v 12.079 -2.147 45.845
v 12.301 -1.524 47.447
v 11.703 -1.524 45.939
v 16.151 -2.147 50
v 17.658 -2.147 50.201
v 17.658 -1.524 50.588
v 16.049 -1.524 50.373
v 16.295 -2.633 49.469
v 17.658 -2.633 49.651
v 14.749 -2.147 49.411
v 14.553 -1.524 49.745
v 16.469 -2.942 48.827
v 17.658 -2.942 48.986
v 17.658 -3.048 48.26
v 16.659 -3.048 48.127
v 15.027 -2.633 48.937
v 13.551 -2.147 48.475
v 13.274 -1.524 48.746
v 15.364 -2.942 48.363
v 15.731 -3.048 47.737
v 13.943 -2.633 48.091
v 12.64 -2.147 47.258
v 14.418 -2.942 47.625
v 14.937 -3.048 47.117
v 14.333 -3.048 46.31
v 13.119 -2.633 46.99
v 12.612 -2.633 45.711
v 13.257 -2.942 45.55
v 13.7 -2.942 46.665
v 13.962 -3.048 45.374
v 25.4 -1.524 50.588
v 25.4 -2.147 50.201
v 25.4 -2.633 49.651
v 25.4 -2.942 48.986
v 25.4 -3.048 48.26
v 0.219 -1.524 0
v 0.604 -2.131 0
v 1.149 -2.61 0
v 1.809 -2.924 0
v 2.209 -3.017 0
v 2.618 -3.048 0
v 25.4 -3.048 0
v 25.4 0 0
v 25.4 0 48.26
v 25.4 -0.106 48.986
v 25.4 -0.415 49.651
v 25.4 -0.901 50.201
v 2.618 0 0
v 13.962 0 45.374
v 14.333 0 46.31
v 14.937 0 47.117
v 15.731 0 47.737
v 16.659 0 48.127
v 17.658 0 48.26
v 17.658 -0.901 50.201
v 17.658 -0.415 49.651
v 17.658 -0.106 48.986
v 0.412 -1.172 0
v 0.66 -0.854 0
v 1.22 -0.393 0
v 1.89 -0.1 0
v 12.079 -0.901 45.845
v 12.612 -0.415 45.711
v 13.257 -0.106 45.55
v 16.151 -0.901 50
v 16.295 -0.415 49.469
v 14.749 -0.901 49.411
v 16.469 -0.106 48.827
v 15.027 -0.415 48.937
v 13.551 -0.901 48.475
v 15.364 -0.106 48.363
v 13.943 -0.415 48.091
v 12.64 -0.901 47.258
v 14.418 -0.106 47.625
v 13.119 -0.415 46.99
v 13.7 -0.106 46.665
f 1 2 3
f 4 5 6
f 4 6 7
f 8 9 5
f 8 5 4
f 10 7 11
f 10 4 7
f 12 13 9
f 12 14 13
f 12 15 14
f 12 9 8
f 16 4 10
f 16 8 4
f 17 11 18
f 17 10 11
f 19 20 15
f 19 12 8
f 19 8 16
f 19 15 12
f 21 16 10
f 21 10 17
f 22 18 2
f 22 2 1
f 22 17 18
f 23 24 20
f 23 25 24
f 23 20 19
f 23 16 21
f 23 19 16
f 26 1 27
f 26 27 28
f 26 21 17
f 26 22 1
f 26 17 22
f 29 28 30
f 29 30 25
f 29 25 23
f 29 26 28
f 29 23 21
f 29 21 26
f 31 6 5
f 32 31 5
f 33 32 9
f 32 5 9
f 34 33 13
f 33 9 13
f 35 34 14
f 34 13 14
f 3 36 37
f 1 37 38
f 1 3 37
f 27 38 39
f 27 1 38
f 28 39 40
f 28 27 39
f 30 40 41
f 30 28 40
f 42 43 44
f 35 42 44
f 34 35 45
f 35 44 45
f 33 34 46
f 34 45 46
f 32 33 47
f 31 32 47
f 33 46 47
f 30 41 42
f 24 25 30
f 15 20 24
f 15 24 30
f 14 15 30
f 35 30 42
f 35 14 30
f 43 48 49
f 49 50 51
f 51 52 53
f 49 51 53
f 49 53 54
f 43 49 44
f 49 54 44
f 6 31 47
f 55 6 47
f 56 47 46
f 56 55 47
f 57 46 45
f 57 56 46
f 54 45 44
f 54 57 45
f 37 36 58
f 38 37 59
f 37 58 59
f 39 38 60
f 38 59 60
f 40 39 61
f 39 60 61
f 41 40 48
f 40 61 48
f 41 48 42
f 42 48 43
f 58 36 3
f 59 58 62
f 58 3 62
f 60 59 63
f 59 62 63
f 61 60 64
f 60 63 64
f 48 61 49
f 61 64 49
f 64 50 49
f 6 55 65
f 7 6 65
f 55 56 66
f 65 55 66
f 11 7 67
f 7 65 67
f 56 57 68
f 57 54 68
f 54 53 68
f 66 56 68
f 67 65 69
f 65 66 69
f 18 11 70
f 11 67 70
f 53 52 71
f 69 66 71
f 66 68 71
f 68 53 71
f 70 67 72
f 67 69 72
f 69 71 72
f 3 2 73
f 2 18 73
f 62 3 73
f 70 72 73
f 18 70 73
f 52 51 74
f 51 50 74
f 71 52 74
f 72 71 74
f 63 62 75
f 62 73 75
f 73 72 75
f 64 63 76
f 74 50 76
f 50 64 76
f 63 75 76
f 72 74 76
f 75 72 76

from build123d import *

# Parameters (mm, degrees)
F1_DEPTH    = 3.048
F2_T1_DEPTH = 53.7555112647
F2_T3_DEPTH = 14.0920698193
F2_T6_ANGLE = 75.9637565321
F2_T8_ANGLE = 75.9637565321


# Not quite as in the source:
# - a fillet or chamfer that OpenCascade refuses, or shapes differently, is made with other operations: its cross-section is extruded or revolved along the edge and cut away or added


with BuildPart() as f1:
    # F0 (on Front) → F1 (new body)
    with BuildSketch(Plane.XZ):
        with BuildLine():
            Line((25.4, 50.8), (17.6579301807, 50.8))
            ThreePointArc((17.6579301807, 50.8), (13.750062651, 49.4551045314), (11.4975253047, 45.990101219))
            Line((11.4975253047, 45.990101219), (0, 0))
            Line((0, 0), (25.4, 0))
            Line((25.4, 0), (25.4, 50.8))
        make_face()
    extrude(amount=F1_DEPTH)

    # F2: fillet of radius 2.54 on 2 edges, made by hand

    # F2_s2 → F2_t1 (cut)
    with BuildSketch(Plane(origin=(11.4975253047, 0, 45.990101219), x_dir=(0, 1, 0), z_dir=(-0.242535625, 0, -0.9701425001))):
        with BuildLine():
            ThreePointArc((-0.508, 0), (-2.3040512242, 0.7439487758), (-3.048, 2.54))
            Line((-3.048, 2.54), (-3.048, 0))
            Line((-3.048, 0), (-0.508, 0))
        make_face()
        with BuildLine():
            ThreePointArc((-2.54, 0), (-0.7439487758, 0.7439487758), (0, 2.54))
            Line((0, 2.54), (0, 0))
            Line((0, 0), (-2.54, 0))
        make_face()
    extrude(amount=F2_T1_DEPTH, mode=Mode.SUBTRACT)

    # F2_s4 → F2_t3 (cut)
    with BuildSketch(Plane.YZ.offset(17.6579301807)):
        with BuildLine():
            ThreePointArc((-2.54, 50.8), (-0.7439487758, 50.0560512242), (0, 48.26))
            Line((0, 48.26), (0, 50.8))
            Line((0, 50.8), (-2.54, 50.8))
        make_face()
        with BuildLine():
            ThreePointArc((-0.508, 50.8), (-2.3040512242, 50.0560512242), (-3.048, 48.26))
            Line((-3.048, 48.26), (-3.048, 50.8))
            Line((-3.048, 50.8), (-0.508, 50.8))
        make_face()
    extrude(amount=F2_T3_DEPTH, mode=Mode.SUBTRACT)

    # F2_s5 → F2_t6 (revolve, cut)
    with BuildSketch(Plane.YZ.offset(17.6579301807)):
        with BuildLine():
            ThreePointArc((-2.54, 50.8), (-0.7439487758, 50.0560512242), (0, 48.26))
            Line((0, 48.26), (0, 50.8))
            Line((0, 50.8), (-2.54, 50.8))
        make_face()
    revolve(axis=Axis((17.6579301807, 0, 44.45), (0, -1, 0)), revolution_arc=F2_T6_ANGLE, mode=Mode.SUBTRACT)

    # F2_s7 → F2_t8 (revolve, cut)
    with BuildSketch(Plane.YZ.offset(17.6579301807)):
        with BuildLine():
            ThreePointArc((-0.508, 50.8), (-2.3040512242, 50.0560512242), (-3.048, 48.26))
            Line((-3.048, 48.26), (-3.048, 50.8))
            Line((-3.048, 50.8), (-0.508, 50.8))
        make_face()
    revolve(axis=Axis((17.6579301807, -3.048, 44.45), (0, -1, 0)), revolution_arc=F2_T8_ANGLE, mode=Mode.SUBTRACT)


solid = f1.part
